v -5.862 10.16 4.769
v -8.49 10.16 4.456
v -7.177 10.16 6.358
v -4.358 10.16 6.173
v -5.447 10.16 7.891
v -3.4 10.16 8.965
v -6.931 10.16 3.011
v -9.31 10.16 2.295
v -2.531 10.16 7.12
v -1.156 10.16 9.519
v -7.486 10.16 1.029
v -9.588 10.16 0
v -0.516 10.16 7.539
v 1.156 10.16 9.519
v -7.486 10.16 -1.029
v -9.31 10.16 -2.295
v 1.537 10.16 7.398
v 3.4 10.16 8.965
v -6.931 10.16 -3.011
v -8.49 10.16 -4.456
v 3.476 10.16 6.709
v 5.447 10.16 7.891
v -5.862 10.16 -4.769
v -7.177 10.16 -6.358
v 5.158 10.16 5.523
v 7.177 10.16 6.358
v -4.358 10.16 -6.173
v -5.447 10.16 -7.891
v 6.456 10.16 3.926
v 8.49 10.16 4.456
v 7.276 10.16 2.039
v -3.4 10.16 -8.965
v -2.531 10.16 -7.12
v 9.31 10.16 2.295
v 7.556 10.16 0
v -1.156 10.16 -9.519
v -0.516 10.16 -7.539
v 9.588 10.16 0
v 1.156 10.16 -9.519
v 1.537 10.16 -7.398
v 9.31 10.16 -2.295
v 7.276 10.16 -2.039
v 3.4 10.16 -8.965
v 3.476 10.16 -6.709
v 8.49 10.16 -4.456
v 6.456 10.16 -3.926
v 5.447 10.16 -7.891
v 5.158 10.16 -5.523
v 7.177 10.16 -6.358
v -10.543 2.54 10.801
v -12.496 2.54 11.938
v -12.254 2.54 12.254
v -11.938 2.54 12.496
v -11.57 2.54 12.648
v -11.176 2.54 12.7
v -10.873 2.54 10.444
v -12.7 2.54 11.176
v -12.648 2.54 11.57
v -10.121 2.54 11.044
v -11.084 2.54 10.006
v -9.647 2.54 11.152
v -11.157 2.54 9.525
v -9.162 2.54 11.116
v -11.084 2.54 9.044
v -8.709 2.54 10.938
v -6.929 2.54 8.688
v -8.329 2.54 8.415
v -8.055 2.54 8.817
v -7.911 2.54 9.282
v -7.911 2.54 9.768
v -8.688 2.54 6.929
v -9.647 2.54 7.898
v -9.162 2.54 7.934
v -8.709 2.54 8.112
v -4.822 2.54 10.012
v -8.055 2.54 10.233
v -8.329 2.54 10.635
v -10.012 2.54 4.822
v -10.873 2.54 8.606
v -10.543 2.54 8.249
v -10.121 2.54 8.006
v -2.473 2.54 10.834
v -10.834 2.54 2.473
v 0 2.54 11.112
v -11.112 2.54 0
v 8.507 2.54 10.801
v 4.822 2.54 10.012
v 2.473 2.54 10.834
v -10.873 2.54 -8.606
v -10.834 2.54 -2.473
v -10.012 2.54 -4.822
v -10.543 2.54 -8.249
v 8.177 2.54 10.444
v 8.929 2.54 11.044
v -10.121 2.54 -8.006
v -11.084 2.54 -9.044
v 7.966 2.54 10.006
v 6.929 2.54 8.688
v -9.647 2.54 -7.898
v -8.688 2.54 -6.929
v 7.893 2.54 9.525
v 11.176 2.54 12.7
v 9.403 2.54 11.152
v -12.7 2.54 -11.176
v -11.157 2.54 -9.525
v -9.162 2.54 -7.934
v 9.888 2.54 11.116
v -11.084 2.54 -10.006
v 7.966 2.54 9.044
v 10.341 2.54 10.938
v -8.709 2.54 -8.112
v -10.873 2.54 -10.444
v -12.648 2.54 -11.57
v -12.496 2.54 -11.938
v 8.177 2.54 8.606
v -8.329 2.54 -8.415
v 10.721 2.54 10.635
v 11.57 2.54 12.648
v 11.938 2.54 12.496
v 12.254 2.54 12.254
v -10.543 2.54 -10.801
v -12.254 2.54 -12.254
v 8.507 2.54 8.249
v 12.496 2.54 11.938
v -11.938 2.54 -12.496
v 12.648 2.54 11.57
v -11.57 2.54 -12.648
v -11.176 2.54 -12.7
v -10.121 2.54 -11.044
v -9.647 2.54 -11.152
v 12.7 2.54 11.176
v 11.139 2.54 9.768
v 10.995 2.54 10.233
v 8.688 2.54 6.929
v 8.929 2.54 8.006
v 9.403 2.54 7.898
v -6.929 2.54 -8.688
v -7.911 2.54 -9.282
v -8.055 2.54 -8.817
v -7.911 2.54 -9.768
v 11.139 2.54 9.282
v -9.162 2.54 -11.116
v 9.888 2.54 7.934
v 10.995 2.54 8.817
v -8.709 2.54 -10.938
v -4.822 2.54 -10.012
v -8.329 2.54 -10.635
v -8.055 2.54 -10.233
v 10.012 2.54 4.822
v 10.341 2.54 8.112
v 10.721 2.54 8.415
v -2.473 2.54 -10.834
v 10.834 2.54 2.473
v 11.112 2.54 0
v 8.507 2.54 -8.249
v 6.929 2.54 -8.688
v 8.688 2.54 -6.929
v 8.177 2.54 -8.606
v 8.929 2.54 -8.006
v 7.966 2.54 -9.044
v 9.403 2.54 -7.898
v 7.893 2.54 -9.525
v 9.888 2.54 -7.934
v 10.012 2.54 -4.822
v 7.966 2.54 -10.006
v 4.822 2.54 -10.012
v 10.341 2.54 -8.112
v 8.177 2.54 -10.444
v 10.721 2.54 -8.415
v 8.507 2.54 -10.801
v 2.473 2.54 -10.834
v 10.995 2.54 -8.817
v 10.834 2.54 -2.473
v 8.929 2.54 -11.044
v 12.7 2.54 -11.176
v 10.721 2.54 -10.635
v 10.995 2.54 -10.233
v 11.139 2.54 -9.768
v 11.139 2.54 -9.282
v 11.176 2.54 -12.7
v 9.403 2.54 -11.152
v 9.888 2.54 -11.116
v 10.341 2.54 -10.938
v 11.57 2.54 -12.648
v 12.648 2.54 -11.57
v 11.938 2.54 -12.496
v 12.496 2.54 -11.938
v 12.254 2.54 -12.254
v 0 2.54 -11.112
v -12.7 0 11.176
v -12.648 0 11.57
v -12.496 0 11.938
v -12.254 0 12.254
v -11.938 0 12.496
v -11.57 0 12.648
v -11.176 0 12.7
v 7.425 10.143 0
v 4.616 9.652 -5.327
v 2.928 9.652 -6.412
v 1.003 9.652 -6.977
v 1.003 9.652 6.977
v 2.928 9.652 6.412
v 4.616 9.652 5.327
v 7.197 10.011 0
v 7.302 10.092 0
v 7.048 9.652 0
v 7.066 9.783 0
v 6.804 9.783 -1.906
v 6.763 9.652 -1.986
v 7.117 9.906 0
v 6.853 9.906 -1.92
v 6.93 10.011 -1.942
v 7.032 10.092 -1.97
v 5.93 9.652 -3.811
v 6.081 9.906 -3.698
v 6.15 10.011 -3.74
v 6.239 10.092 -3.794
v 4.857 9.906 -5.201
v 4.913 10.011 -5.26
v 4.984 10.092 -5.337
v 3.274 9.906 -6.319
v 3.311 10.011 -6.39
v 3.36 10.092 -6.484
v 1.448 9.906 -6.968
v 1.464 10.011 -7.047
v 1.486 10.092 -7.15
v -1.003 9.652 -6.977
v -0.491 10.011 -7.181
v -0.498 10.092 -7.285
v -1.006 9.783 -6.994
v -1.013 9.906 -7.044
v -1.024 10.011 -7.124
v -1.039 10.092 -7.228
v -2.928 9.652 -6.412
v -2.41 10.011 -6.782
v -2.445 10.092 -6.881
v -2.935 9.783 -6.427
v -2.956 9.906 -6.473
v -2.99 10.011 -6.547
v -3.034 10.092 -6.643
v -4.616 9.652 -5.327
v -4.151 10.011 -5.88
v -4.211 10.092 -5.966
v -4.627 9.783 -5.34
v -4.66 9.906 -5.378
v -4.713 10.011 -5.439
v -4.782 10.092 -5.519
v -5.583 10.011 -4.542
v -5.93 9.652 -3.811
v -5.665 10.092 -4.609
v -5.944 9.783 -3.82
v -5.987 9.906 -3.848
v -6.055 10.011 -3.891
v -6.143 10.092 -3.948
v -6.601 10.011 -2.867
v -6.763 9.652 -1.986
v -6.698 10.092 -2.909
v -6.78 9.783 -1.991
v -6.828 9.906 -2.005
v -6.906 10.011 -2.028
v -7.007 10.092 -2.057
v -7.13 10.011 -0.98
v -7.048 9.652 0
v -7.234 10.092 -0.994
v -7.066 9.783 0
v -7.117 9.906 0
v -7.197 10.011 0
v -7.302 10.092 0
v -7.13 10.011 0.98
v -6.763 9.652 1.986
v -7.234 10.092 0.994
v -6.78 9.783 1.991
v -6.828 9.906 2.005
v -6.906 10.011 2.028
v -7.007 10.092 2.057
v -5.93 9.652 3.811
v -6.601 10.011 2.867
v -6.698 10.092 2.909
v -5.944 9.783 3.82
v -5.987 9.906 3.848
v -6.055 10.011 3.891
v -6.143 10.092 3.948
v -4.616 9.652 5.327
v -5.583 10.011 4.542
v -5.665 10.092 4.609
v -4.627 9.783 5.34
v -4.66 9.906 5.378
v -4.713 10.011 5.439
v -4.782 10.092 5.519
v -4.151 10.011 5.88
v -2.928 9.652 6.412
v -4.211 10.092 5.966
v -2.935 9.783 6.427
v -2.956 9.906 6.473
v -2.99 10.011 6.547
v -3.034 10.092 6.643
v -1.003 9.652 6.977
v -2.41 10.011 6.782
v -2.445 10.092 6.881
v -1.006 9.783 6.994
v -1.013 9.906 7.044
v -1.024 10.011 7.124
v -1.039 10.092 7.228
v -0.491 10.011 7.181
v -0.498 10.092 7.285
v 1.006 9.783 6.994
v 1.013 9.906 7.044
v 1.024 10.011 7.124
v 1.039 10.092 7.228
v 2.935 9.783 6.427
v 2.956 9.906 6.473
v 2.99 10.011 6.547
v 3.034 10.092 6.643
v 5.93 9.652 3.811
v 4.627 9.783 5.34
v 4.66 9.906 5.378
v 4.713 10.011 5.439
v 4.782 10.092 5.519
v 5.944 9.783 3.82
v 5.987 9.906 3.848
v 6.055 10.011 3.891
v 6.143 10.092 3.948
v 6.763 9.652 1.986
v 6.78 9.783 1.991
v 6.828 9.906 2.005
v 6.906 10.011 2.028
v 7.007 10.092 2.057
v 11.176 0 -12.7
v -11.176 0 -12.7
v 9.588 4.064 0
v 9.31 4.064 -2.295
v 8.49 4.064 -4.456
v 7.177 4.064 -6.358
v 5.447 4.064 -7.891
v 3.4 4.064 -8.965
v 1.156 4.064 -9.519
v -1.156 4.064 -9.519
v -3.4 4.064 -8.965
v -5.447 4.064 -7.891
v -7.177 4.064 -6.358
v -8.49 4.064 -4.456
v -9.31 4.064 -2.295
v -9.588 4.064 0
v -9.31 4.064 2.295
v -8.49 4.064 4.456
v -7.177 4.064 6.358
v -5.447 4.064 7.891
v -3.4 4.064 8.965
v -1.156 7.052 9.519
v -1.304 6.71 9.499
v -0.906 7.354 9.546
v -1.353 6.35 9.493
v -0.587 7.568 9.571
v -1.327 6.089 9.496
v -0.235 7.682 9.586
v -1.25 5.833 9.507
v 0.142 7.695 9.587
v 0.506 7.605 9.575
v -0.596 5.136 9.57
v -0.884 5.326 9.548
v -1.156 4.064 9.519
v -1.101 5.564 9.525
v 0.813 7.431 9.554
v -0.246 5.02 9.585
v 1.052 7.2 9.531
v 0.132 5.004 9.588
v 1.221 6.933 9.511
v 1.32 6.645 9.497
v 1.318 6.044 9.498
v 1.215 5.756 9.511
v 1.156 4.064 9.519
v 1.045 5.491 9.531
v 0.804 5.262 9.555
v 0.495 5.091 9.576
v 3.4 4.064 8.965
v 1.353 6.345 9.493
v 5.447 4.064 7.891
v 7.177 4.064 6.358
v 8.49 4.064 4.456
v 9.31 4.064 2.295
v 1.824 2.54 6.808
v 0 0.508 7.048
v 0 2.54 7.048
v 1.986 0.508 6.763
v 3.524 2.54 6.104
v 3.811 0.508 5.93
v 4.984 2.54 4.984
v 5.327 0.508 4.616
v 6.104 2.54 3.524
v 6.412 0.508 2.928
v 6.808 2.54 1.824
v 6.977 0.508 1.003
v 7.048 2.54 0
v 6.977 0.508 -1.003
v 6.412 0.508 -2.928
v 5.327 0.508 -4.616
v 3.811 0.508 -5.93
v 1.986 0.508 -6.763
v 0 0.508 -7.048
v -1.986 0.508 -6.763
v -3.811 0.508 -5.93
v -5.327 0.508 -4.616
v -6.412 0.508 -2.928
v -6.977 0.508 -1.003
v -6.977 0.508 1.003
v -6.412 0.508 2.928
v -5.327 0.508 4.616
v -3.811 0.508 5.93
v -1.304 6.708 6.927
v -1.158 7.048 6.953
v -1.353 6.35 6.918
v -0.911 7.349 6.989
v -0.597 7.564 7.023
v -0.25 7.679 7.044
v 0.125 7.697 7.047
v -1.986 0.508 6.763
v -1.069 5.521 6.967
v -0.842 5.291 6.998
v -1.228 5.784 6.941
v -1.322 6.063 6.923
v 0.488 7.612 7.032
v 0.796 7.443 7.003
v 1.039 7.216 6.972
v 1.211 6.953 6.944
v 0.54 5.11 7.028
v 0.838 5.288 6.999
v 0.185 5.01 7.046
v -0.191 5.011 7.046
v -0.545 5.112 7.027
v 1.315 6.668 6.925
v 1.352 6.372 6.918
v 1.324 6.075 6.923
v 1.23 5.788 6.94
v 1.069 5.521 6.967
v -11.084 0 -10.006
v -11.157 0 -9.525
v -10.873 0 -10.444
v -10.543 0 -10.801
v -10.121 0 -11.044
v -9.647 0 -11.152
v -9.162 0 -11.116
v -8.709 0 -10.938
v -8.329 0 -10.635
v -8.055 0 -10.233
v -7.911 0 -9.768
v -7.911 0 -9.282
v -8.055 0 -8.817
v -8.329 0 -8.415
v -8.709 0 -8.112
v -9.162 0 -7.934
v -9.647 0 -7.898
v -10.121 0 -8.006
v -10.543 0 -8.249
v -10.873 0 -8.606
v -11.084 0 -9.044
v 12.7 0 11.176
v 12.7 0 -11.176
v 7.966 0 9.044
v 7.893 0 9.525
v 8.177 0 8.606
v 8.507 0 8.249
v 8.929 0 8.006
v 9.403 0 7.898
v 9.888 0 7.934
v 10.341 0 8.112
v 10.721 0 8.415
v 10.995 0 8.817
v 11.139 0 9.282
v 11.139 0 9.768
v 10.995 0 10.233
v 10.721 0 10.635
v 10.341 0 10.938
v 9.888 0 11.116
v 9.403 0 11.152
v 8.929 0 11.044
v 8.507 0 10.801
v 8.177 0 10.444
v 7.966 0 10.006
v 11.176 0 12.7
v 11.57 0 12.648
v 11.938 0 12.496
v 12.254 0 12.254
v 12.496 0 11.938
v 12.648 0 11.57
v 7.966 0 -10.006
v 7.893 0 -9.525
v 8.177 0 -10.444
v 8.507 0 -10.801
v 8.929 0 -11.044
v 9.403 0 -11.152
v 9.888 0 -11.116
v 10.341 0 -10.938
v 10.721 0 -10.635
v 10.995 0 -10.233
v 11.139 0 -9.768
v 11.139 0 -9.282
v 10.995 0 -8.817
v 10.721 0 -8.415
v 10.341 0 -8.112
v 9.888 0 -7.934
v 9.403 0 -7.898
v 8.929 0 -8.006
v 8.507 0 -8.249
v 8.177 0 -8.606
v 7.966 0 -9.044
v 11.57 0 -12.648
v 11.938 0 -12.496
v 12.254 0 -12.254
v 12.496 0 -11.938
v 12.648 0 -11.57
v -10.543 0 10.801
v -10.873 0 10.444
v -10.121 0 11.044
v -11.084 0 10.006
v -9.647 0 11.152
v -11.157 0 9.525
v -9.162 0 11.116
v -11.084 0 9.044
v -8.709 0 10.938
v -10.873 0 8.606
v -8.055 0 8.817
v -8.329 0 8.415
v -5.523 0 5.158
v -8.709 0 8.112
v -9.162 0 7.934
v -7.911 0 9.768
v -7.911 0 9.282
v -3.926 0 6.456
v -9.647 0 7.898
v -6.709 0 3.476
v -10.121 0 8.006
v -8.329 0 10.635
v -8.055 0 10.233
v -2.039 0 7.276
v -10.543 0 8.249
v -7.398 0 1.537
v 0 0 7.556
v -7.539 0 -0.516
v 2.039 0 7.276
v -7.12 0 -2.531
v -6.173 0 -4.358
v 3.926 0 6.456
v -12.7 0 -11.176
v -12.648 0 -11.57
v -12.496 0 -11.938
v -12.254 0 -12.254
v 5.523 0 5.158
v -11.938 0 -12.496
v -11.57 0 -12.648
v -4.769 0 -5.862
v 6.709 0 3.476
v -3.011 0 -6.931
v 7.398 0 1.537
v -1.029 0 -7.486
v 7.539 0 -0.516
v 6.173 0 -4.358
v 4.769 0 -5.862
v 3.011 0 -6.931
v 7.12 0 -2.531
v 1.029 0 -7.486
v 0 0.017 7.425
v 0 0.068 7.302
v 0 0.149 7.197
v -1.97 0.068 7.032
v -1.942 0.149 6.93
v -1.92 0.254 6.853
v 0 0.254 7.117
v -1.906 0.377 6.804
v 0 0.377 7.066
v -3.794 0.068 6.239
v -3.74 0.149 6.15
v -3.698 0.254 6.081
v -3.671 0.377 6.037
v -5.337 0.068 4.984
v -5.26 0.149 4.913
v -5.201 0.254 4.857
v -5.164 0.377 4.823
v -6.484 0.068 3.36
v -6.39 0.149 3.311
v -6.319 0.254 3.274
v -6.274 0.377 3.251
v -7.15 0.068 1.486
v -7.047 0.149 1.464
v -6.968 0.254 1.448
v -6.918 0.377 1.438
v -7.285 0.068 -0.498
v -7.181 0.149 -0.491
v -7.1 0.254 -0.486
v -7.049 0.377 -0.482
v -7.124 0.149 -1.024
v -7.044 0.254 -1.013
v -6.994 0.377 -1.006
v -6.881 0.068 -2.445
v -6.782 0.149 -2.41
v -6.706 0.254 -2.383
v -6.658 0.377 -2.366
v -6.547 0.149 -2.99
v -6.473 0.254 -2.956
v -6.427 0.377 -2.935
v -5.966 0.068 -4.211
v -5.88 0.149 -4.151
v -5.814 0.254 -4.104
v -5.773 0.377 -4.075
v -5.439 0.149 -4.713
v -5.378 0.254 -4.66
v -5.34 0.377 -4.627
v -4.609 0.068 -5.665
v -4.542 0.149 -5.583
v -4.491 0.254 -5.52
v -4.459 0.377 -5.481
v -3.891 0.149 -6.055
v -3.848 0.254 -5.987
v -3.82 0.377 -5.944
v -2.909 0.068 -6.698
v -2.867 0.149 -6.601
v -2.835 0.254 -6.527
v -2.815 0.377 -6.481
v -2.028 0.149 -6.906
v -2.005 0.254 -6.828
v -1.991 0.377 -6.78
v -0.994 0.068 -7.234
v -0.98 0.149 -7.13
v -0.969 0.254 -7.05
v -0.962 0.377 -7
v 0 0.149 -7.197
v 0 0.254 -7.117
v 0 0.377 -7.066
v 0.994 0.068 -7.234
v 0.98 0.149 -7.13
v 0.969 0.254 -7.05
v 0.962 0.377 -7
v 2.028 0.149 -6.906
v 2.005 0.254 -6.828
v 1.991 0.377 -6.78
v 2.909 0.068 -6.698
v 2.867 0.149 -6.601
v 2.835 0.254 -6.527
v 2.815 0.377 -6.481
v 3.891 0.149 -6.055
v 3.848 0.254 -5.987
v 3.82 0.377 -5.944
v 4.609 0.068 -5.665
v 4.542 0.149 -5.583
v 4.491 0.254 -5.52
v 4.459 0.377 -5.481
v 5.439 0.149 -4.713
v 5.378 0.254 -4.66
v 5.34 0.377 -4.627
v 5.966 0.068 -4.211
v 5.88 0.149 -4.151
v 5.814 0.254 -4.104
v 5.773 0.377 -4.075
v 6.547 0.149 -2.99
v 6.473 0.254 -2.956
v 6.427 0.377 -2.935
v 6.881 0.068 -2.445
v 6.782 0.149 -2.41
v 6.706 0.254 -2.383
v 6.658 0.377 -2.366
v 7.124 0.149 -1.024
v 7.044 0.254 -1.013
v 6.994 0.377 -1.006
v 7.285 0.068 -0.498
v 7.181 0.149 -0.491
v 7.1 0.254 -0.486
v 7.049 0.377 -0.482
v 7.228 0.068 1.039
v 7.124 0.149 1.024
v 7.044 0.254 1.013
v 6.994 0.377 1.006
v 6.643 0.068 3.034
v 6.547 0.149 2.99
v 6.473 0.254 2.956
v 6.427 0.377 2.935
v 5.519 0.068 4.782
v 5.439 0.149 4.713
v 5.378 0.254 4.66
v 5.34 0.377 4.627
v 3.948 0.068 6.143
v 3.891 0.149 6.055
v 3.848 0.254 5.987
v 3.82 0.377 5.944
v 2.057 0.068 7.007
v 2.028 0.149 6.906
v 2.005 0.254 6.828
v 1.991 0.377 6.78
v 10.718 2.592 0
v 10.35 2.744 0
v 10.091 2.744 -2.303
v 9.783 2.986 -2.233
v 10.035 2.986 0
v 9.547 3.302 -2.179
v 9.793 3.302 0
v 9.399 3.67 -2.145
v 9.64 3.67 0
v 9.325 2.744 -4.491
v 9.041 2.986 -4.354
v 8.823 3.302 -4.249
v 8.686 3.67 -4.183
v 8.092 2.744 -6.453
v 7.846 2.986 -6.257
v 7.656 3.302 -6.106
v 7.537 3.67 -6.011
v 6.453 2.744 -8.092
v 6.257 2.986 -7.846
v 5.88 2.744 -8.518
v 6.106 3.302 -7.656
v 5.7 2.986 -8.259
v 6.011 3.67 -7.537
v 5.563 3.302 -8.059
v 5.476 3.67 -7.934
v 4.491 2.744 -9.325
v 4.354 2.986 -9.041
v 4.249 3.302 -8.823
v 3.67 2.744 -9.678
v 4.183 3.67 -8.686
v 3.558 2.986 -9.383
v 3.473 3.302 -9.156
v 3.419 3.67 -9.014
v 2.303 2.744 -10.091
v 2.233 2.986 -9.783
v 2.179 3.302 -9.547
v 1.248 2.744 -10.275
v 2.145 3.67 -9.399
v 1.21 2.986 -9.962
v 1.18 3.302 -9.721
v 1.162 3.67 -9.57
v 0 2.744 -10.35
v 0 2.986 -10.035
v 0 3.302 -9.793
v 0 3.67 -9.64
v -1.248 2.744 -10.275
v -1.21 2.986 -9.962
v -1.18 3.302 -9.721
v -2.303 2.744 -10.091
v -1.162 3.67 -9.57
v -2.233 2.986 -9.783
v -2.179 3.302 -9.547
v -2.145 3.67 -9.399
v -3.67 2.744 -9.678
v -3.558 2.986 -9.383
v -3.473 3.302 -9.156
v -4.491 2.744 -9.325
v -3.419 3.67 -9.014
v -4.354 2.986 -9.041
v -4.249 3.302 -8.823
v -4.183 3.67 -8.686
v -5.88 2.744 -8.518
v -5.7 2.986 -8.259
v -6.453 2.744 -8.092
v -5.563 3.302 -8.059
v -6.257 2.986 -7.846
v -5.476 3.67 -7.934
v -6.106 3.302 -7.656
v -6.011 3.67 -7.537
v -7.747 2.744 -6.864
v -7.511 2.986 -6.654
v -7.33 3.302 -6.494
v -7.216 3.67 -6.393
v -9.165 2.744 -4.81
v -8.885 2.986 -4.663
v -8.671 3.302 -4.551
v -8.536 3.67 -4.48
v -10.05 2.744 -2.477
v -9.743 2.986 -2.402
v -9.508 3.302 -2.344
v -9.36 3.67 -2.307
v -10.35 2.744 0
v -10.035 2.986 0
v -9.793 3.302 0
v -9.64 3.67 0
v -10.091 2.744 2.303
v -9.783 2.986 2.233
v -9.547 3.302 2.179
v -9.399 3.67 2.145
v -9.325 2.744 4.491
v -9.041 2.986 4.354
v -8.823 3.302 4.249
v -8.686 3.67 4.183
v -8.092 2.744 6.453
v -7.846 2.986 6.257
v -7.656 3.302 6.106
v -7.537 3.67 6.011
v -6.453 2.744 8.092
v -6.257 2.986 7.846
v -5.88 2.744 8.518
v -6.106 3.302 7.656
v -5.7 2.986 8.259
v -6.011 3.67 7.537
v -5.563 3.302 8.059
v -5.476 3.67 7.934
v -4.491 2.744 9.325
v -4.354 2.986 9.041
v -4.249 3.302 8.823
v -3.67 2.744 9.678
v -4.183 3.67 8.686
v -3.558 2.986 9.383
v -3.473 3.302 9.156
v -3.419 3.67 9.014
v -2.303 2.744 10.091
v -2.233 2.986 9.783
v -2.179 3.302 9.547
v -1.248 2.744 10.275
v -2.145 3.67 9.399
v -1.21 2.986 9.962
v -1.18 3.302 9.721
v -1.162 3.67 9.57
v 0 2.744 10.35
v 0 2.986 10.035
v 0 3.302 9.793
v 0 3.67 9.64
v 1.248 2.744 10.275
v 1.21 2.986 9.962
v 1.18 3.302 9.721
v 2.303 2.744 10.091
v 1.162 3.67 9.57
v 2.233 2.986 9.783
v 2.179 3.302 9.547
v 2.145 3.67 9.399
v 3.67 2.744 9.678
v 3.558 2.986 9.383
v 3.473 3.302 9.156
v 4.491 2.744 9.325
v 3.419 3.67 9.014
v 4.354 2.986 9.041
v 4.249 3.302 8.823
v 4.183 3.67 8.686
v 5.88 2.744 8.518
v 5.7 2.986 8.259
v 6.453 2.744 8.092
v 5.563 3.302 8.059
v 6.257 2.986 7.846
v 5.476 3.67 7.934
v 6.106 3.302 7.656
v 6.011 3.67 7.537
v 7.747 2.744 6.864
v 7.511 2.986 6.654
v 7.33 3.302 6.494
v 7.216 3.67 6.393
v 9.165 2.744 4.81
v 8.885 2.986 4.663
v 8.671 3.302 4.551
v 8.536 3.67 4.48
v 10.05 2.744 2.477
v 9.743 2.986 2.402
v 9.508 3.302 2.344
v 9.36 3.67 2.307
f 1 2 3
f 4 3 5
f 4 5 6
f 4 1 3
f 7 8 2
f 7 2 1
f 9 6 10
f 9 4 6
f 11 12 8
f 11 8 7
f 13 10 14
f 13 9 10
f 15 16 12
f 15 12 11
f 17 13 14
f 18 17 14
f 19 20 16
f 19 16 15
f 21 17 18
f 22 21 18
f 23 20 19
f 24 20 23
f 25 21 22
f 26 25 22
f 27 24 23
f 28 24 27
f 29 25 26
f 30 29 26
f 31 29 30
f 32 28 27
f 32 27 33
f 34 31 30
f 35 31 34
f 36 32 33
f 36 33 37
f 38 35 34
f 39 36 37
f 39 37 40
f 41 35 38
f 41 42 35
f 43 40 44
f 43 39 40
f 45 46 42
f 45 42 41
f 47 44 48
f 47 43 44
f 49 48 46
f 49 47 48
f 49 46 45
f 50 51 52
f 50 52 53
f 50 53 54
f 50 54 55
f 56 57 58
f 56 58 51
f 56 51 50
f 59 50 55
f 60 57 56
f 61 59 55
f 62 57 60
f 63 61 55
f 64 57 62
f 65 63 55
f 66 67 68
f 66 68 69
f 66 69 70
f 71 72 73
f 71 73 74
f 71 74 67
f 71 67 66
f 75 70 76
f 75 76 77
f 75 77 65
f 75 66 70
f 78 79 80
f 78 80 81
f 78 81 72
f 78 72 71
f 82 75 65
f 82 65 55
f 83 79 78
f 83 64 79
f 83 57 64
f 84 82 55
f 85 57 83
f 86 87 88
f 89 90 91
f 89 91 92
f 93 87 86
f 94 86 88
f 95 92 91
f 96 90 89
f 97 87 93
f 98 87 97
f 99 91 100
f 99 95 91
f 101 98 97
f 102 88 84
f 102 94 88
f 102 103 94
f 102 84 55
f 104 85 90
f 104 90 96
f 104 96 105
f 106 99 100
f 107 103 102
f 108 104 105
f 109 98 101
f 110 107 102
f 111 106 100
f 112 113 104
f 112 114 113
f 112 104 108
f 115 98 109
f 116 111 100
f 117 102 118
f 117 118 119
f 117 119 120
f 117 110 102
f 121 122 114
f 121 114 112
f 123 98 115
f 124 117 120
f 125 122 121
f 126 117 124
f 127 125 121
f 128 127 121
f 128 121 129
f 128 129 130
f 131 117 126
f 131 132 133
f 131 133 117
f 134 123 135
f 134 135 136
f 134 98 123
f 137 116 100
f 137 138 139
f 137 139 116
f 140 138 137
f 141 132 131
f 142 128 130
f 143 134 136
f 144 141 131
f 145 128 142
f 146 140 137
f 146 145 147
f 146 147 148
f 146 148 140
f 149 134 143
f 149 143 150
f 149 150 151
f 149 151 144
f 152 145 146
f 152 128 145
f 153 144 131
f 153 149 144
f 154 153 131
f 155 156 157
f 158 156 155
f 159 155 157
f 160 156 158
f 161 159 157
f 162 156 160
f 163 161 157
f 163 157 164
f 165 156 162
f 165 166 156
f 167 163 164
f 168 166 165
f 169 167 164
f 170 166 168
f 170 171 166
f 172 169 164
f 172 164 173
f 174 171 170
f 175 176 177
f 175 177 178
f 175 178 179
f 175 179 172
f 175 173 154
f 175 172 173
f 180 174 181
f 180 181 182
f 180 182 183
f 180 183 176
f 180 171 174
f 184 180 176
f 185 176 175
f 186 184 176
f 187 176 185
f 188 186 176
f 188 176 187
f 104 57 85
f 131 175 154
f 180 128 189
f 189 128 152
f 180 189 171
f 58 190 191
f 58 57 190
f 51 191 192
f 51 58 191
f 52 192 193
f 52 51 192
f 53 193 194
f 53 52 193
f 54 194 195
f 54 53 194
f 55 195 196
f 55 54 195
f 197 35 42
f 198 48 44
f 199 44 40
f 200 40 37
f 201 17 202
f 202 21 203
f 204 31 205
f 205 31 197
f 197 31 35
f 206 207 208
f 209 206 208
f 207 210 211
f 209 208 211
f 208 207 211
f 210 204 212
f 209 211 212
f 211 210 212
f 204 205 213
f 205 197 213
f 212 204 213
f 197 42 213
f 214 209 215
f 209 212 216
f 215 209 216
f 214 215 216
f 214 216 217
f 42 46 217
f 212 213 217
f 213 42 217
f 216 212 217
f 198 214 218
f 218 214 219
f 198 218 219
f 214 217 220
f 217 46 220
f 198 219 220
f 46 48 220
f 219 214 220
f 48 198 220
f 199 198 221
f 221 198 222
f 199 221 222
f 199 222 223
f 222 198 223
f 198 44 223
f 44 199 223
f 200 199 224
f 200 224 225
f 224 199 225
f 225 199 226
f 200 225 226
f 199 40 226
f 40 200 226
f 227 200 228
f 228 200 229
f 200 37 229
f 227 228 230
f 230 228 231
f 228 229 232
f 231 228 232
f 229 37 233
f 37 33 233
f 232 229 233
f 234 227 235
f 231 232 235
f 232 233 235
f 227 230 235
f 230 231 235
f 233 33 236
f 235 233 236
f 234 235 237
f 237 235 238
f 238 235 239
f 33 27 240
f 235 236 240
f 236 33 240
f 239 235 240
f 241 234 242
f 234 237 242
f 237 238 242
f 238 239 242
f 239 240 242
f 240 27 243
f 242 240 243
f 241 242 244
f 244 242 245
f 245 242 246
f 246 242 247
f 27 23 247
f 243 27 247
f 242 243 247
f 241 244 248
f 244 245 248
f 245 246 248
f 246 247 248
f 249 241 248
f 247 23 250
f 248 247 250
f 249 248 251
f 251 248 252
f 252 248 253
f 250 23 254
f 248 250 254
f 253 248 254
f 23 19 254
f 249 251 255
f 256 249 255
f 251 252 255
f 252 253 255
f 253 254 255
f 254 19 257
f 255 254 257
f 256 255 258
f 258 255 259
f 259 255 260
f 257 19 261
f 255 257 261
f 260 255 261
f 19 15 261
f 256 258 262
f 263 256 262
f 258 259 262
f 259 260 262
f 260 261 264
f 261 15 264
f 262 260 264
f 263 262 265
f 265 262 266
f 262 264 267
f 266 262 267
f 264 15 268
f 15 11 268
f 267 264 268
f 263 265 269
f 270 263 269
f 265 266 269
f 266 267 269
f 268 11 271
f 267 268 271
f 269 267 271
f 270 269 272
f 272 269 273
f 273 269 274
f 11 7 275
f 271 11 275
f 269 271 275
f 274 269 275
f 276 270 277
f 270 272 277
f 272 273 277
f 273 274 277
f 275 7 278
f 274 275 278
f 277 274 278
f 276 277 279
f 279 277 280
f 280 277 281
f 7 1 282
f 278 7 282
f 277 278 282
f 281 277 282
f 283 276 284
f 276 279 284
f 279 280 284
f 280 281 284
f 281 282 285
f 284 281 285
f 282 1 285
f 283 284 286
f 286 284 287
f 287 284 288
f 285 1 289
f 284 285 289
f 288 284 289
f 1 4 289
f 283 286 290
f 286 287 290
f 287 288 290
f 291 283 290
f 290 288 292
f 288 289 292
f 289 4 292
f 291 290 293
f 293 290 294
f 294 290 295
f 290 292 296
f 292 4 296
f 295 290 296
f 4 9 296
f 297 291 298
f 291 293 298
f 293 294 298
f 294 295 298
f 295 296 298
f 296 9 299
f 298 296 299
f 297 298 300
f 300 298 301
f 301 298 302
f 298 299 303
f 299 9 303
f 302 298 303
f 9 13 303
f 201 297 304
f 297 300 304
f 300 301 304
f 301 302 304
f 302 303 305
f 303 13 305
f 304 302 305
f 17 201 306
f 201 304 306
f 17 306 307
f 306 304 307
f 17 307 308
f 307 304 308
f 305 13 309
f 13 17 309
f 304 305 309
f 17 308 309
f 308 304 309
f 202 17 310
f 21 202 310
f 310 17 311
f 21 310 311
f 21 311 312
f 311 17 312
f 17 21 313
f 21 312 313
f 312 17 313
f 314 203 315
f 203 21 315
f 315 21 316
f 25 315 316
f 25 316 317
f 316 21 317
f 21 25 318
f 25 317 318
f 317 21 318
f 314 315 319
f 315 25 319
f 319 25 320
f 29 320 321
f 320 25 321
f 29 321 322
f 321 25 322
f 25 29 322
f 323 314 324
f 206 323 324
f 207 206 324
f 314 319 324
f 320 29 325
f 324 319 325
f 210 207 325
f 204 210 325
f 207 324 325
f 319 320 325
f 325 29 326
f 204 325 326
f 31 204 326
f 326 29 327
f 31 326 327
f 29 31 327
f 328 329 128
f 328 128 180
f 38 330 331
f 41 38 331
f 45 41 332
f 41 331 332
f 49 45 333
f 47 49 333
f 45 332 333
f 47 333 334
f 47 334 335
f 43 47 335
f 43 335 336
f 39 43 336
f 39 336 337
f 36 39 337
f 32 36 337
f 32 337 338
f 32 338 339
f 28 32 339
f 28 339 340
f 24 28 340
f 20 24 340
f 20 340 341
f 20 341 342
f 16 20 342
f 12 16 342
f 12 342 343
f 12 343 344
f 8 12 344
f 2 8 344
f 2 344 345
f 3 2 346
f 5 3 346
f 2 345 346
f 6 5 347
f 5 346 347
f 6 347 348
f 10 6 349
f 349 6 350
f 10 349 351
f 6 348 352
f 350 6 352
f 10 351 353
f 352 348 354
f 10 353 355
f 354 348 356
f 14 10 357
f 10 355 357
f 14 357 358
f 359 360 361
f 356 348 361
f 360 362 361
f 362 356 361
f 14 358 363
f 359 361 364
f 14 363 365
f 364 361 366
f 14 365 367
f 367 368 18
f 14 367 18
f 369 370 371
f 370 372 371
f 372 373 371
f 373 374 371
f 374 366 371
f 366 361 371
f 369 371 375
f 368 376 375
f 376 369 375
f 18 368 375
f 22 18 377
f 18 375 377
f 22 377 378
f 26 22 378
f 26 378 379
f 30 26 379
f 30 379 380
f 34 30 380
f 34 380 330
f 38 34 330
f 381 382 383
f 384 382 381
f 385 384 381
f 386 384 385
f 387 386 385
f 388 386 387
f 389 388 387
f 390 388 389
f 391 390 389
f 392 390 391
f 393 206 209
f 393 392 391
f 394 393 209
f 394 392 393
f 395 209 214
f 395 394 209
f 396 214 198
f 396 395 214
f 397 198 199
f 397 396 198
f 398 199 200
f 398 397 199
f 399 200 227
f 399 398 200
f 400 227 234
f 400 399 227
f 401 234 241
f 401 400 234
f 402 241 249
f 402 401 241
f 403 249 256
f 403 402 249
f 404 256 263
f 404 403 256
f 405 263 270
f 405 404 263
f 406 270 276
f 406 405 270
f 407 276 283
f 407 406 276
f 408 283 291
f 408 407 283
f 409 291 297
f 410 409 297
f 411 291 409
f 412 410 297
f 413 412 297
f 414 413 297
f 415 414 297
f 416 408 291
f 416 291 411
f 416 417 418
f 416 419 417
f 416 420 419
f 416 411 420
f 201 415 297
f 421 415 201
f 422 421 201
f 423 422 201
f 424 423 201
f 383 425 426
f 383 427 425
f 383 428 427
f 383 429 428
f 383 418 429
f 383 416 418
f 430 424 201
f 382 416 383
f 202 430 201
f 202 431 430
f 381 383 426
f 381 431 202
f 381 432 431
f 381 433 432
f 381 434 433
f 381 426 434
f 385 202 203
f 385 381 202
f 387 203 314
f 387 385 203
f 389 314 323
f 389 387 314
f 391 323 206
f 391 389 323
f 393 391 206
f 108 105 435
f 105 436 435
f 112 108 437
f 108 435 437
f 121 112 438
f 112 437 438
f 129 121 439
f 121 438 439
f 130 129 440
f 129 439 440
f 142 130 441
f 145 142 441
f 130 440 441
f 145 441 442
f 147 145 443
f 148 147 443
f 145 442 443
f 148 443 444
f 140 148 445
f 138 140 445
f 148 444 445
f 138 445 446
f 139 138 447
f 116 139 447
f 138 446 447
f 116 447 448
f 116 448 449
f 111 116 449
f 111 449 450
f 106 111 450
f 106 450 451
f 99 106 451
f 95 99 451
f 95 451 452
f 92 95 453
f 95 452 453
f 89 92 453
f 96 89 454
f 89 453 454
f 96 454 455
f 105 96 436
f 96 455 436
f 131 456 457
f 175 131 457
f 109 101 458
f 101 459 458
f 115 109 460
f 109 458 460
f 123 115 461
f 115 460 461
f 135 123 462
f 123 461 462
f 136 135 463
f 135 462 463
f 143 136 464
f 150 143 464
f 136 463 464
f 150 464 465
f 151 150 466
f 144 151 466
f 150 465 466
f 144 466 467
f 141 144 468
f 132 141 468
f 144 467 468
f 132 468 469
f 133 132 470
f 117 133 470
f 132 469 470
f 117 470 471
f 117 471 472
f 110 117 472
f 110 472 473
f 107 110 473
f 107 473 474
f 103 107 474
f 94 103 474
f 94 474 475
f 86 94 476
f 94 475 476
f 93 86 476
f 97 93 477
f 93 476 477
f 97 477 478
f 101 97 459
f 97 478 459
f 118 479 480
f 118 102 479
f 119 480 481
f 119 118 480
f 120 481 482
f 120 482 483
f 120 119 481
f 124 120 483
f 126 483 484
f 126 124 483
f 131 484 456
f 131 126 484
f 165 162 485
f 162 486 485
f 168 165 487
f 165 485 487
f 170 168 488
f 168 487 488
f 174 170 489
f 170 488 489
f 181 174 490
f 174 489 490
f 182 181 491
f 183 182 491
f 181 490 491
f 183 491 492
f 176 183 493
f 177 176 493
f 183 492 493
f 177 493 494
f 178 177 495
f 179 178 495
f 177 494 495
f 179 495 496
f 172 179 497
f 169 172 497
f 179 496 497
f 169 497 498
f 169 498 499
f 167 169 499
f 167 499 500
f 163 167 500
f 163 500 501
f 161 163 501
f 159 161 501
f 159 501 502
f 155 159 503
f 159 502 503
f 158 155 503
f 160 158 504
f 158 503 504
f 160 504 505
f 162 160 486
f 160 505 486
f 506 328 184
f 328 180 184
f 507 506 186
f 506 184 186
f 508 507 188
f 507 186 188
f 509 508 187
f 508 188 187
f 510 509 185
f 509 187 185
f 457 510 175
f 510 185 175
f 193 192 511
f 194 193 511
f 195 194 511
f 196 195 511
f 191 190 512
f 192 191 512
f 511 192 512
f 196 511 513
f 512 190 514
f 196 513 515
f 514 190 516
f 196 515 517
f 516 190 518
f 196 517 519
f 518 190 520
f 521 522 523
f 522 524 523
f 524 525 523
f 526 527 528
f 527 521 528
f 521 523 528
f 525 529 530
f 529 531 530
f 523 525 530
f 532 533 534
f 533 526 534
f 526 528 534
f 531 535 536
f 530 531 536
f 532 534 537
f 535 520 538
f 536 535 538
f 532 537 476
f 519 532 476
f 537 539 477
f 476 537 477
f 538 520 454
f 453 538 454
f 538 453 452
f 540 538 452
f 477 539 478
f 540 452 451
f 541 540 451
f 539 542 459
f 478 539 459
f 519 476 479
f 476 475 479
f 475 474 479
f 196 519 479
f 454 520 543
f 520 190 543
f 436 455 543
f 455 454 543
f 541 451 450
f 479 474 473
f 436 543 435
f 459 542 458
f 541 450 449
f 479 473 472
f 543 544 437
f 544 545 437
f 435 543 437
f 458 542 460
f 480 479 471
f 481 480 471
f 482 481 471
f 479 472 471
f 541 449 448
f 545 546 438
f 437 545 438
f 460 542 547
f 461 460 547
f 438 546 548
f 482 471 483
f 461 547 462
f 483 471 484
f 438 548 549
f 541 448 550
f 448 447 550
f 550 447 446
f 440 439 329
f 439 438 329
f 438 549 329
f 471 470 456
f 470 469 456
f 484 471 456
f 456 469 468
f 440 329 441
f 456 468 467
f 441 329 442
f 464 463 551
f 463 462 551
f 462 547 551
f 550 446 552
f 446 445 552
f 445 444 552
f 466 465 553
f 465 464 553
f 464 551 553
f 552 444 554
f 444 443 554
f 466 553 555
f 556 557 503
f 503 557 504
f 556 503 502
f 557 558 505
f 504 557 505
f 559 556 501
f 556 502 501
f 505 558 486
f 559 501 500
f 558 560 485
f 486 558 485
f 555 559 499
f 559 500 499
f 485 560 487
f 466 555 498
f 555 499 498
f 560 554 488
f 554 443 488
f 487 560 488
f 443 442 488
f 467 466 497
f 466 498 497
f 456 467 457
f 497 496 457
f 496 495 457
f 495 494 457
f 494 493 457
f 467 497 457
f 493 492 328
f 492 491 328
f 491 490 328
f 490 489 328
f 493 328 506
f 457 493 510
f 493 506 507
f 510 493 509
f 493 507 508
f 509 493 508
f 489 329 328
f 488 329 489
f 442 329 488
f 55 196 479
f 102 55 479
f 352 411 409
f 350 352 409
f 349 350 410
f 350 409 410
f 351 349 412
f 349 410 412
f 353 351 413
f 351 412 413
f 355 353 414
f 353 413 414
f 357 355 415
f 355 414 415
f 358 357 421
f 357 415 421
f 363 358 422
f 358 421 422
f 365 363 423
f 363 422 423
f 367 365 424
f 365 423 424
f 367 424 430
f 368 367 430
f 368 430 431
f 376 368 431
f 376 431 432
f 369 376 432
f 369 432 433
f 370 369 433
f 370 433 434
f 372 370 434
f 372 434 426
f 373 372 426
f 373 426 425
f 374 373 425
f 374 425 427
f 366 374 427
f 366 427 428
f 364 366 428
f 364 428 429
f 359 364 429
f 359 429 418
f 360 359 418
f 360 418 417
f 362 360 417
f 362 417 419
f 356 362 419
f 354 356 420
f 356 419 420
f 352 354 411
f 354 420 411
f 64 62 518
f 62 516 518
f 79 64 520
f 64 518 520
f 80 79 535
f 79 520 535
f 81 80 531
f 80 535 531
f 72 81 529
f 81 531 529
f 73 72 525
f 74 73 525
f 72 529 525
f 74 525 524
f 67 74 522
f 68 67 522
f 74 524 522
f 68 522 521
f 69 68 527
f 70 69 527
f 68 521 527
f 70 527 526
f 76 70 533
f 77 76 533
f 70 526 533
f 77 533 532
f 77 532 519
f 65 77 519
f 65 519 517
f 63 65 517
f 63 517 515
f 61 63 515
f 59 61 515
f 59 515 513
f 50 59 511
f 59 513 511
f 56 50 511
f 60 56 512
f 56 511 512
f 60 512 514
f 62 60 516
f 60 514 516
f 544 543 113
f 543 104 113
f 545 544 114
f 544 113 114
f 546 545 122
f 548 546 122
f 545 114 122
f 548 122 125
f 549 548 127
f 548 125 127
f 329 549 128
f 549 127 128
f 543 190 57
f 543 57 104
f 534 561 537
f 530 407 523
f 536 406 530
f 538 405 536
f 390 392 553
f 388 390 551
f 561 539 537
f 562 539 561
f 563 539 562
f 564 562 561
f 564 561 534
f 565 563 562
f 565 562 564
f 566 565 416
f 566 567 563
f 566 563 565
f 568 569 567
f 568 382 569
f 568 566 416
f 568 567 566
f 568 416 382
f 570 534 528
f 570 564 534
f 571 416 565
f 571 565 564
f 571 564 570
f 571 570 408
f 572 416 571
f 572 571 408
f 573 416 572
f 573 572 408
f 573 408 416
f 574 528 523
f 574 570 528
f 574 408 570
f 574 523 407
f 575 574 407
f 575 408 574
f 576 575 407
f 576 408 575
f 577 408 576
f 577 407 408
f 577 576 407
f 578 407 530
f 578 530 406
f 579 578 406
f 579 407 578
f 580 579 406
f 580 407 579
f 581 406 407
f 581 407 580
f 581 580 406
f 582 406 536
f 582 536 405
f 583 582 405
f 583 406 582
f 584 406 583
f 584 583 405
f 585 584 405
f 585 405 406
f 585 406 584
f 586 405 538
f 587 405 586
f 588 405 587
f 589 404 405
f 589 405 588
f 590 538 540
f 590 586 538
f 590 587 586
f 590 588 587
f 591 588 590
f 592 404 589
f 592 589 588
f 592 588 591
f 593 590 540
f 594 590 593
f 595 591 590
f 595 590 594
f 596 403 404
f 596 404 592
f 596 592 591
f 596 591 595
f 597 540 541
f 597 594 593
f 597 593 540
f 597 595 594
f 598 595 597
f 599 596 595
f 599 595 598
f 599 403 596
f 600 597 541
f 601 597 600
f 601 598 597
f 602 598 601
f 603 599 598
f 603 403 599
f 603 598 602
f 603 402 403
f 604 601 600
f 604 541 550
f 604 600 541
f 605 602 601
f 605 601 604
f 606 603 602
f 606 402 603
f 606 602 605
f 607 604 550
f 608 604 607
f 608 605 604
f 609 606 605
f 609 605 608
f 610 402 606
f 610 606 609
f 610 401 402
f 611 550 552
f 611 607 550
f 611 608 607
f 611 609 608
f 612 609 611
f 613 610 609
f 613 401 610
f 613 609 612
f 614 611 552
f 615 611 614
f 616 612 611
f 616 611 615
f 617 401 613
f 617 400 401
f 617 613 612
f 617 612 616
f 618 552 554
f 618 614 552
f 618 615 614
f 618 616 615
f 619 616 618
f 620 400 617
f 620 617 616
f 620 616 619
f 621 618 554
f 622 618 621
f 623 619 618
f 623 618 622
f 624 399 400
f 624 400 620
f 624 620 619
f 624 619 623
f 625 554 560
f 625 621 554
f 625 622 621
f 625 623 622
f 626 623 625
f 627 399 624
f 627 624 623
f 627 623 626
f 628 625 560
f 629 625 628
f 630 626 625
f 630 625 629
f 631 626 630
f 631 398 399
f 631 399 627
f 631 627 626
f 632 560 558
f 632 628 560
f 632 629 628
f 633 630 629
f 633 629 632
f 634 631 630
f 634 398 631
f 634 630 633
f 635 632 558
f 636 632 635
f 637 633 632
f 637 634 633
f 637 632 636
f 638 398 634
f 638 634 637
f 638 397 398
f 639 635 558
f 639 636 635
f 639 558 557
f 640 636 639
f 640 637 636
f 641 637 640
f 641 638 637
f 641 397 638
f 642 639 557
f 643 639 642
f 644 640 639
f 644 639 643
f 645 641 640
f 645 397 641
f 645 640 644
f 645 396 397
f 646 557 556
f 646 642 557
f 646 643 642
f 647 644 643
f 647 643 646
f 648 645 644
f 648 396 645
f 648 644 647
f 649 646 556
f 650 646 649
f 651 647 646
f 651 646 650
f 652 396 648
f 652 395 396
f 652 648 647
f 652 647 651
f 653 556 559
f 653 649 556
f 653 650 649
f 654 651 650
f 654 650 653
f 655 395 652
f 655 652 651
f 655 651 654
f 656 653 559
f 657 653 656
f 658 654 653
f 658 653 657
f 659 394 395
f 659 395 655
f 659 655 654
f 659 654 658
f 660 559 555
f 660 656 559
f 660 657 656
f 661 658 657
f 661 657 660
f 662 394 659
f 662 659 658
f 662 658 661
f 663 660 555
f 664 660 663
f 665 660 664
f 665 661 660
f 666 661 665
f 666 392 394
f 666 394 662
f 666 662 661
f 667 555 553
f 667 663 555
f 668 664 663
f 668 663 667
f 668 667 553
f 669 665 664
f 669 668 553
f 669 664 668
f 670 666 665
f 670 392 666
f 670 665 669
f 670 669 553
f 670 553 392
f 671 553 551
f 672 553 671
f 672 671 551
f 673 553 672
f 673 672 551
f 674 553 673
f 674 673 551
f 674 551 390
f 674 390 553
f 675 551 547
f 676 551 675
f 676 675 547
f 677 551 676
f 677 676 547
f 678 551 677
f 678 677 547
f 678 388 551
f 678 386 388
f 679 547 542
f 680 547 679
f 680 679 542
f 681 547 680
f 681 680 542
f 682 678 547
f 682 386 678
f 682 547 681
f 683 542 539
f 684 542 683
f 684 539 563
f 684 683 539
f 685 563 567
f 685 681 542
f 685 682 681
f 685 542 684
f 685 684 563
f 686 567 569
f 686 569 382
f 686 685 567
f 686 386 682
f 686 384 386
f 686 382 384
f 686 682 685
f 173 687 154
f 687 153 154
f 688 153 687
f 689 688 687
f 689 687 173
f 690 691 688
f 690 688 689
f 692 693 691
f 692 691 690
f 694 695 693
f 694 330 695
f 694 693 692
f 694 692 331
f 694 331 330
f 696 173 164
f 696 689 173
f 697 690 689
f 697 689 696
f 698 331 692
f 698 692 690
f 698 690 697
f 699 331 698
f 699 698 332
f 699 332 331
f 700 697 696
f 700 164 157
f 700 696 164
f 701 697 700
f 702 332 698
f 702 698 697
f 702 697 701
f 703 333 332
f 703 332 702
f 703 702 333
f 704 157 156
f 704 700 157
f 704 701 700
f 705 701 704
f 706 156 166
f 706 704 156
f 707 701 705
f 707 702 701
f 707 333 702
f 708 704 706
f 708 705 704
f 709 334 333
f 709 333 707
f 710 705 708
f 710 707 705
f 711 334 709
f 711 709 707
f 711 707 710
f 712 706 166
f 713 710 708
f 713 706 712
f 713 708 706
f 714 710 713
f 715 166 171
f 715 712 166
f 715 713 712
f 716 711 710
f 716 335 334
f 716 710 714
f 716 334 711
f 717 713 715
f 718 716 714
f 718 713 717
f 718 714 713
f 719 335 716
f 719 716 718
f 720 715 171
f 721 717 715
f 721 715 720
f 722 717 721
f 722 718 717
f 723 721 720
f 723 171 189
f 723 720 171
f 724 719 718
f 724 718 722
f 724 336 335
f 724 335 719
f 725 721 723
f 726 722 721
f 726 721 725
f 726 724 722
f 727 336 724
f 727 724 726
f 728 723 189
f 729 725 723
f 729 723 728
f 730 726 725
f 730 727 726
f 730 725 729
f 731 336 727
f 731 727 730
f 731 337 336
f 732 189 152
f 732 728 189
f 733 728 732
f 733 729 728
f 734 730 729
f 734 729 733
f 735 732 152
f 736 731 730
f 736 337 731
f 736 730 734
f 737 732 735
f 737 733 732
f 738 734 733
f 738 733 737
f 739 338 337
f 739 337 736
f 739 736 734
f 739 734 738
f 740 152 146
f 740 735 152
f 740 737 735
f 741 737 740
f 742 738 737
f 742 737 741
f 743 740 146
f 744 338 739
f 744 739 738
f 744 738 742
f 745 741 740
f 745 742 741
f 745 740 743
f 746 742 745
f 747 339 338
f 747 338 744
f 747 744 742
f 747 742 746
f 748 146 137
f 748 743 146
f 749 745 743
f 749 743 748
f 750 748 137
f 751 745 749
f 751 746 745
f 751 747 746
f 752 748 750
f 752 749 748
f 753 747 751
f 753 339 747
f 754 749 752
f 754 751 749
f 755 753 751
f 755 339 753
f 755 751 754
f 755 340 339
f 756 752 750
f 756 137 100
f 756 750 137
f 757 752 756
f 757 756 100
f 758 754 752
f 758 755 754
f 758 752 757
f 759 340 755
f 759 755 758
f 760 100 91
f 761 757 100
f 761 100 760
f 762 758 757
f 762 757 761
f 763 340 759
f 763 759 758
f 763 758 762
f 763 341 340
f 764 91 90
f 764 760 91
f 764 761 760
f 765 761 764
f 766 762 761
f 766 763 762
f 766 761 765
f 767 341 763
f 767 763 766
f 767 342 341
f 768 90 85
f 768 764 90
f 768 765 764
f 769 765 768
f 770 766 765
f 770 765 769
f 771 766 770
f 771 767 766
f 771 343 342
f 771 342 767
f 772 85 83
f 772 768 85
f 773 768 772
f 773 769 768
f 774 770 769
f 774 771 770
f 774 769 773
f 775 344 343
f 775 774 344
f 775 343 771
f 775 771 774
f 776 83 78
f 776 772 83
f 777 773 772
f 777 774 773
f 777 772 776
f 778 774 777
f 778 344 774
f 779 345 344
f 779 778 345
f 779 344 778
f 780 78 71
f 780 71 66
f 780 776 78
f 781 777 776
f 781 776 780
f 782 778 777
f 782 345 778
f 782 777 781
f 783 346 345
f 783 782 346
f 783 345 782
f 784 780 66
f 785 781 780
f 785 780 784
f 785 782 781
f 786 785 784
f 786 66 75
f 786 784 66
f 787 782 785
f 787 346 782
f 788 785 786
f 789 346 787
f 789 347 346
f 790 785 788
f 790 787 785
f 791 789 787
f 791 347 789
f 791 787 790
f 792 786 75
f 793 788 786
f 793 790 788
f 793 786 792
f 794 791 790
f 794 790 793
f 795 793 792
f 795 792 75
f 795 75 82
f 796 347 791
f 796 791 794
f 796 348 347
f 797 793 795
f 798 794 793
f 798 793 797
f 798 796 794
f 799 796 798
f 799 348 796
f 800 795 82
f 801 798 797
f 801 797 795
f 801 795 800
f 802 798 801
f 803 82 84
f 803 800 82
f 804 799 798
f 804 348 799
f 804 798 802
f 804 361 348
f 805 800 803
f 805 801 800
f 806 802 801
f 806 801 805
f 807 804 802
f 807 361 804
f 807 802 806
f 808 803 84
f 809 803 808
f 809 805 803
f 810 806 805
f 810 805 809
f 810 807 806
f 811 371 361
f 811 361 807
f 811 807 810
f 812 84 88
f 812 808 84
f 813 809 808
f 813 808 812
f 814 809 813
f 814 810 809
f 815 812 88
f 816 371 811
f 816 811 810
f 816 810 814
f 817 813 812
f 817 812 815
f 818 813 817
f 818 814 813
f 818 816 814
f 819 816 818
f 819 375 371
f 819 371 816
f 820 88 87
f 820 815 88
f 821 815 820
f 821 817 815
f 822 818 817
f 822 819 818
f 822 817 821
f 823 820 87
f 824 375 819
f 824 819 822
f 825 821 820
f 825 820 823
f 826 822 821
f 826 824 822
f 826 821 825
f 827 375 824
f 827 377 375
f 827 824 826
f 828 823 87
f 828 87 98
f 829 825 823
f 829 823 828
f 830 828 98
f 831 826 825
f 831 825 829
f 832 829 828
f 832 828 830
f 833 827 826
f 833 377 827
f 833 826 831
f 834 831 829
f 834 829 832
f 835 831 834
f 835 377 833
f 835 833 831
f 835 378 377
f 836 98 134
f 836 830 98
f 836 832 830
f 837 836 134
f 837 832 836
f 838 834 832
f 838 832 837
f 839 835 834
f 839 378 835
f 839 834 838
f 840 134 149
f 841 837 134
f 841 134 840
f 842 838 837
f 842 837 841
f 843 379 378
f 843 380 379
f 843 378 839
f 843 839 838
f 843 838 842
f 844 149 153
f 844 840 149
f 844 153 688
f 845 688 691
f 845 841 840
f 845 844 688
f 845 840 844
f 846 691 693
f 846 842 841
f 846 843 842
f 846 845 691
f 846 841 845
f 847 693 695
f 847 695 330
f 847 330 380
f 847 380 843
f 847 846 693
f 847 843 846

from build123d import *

# Parameters (mm, degrees)
SKETCH1_W                     = 25.4
SKETCH1_H                     = 25.4
BOSS_EXTRUDE1_DEPTH           = 2.54
SKETCH2_R                     = 9.5885
SKETCH2_R_2                   = 7.0485
EXTRUDE_THIN1_DEPTH           = 7.62
TAP_DRILL_FOR_6_32_TAP1_D     = 2.7051
TAP_DRILL_FOR_6_32_TAP1_DEPTH = 12.7
TAP_DRILL_FOR_6_32_TAP1_TIP   = 0.81269403
FILLET1_R                     = 1.524
FILLET2_R                     = 1.524
CUT_EXTRUDE1_START            = -7.62
SKETCH2_2_R                   = 7.0485
CUT_EXTRUDE1_DEPTH            = 7.62
FILLET3_R                     = 0.508
F_4_CLEARANCE_HOLE4_D         = 3.2639
F_4_CLEARANCE_HOLE4_DEPTH     = 2.54
F_4_CLEARANCE_HOLE4_TIP       = 0.980574487


with BuildPart() as part:
    # Sketch1 → Boss-Extrude1 (new body)
    with BuildSketch(Plane(origin=(0, 0, 0), x_dir=(1, 0, 0), z_dir=(0, 1, 0))):
        Rectangle(SKETCH1_W, SKETCH1_H)
    extrude(amount=BOSS_EXTRUDE1_DEPTH)

    # Sketch2 → Extrude-Thin1 (add)
    with BuildSketch(Plane(origin=(0, 2.54, 0), x_dir=(1, 0, 0), z_dir=(0, 1, 0))):
        Circle(SKETCH2_R)
        Circle(SKETCH2_R_2, mode=Mode.SUBTRACT)
    extrude(amount=EXTRUDE_THIN1_DEPTH)

    # Tap Drill for #6-32 Tap1
    with Locations(Plane.XY.offset(12.7)):
        with Locations((0, 6.35)):
            Hole(TAP_DRILL_FOR_6_32_TAP1_D / 2, depth=TAP_DRILL_FOR_6_32_TAP1_DEPTH)
            with Locations((0, 0, -(TAP_DRILL_FOR_6_32_TAP1_DEPTH + TAP_DRILL_FOR_6_32_TAP1_TIP / 2))):  # 118° drill point
                Cone(0, TAP_DRILL_FOR_6_32_TAP1_D / 2, TAP_DRILL_FOR_6_32_TAP1_TIP, mode=Mode.SUBTRACT)

    # Fillet1
    fillet1_edges = [part.edges().sort_by_distance(p)[0] for p in [
        (-9.5885, 2.54, 0),
    ]]
    fillet(fillet1_edges, radius=FILLET1_R)

    # Fillet2
    fillet2_edges = [part.edges().sort_by_distance(p)[0] for p in [
        (-12.7, 1.27, -12.7),
        (12.7, 1.27, -12.7),
        (-12.7, 1.27, 12.7),
        (12.7, 1.27, 12.7),
    ]]
    fillet(fillet2_edges, radius=FILLET2_R)

    # Sketch2<2> → Cut-Extrude1 (cut)
    with BuildSketch(Plane(origin=(0, 2.54, 0), x_dir=(1, 0, 0), z_dir=(0, 1, 0)).offset(CUT_EXTRUDE1_START)):
        Circle(SKETCH2_2_R)
    extrude(amount=CUT_EXTRUDE1_DEPTH, mode=Mode.SUBTRACT)

    # Fillet3
    fillet3_edges = [part.edges().sort_by_distance(p)[0] for p in [
        (-7.0485, 0, 0),
        (-7.0485, 10.16, 0),
    ]]
    fillet(fillet3_edges, radius=FILLET3_R)

    # #4 Clearance Hole4
    with Locations(Plane(origin=(0, 2.54, 0), x_dir=(1, 0, 0), z_dir=(0, 1, 0))):
        with Locations((9.525, 9.525), (9.525, -9.525), (-9.525, -9.525), (-9.525, 9.525)):
            Hole(F_4_CLEARANCE_HOLE4_D / 2, depth=F_4_CLEARANCE_HOLE4_DEPTH)
            with Locations((0, 0, -(F_4_CLEARANCE_HOLE4_DEPTH + F_4_CLEARANCE_HOLE4_TIP / 2))):  # 118° drill point
                Cone(0, F_4_CLEARANCE_HOLE4_D / 2, F_4_CLEARANCE_HOLE4_TIP, mode=Mode.SUBTRACT)


solid = part.part
